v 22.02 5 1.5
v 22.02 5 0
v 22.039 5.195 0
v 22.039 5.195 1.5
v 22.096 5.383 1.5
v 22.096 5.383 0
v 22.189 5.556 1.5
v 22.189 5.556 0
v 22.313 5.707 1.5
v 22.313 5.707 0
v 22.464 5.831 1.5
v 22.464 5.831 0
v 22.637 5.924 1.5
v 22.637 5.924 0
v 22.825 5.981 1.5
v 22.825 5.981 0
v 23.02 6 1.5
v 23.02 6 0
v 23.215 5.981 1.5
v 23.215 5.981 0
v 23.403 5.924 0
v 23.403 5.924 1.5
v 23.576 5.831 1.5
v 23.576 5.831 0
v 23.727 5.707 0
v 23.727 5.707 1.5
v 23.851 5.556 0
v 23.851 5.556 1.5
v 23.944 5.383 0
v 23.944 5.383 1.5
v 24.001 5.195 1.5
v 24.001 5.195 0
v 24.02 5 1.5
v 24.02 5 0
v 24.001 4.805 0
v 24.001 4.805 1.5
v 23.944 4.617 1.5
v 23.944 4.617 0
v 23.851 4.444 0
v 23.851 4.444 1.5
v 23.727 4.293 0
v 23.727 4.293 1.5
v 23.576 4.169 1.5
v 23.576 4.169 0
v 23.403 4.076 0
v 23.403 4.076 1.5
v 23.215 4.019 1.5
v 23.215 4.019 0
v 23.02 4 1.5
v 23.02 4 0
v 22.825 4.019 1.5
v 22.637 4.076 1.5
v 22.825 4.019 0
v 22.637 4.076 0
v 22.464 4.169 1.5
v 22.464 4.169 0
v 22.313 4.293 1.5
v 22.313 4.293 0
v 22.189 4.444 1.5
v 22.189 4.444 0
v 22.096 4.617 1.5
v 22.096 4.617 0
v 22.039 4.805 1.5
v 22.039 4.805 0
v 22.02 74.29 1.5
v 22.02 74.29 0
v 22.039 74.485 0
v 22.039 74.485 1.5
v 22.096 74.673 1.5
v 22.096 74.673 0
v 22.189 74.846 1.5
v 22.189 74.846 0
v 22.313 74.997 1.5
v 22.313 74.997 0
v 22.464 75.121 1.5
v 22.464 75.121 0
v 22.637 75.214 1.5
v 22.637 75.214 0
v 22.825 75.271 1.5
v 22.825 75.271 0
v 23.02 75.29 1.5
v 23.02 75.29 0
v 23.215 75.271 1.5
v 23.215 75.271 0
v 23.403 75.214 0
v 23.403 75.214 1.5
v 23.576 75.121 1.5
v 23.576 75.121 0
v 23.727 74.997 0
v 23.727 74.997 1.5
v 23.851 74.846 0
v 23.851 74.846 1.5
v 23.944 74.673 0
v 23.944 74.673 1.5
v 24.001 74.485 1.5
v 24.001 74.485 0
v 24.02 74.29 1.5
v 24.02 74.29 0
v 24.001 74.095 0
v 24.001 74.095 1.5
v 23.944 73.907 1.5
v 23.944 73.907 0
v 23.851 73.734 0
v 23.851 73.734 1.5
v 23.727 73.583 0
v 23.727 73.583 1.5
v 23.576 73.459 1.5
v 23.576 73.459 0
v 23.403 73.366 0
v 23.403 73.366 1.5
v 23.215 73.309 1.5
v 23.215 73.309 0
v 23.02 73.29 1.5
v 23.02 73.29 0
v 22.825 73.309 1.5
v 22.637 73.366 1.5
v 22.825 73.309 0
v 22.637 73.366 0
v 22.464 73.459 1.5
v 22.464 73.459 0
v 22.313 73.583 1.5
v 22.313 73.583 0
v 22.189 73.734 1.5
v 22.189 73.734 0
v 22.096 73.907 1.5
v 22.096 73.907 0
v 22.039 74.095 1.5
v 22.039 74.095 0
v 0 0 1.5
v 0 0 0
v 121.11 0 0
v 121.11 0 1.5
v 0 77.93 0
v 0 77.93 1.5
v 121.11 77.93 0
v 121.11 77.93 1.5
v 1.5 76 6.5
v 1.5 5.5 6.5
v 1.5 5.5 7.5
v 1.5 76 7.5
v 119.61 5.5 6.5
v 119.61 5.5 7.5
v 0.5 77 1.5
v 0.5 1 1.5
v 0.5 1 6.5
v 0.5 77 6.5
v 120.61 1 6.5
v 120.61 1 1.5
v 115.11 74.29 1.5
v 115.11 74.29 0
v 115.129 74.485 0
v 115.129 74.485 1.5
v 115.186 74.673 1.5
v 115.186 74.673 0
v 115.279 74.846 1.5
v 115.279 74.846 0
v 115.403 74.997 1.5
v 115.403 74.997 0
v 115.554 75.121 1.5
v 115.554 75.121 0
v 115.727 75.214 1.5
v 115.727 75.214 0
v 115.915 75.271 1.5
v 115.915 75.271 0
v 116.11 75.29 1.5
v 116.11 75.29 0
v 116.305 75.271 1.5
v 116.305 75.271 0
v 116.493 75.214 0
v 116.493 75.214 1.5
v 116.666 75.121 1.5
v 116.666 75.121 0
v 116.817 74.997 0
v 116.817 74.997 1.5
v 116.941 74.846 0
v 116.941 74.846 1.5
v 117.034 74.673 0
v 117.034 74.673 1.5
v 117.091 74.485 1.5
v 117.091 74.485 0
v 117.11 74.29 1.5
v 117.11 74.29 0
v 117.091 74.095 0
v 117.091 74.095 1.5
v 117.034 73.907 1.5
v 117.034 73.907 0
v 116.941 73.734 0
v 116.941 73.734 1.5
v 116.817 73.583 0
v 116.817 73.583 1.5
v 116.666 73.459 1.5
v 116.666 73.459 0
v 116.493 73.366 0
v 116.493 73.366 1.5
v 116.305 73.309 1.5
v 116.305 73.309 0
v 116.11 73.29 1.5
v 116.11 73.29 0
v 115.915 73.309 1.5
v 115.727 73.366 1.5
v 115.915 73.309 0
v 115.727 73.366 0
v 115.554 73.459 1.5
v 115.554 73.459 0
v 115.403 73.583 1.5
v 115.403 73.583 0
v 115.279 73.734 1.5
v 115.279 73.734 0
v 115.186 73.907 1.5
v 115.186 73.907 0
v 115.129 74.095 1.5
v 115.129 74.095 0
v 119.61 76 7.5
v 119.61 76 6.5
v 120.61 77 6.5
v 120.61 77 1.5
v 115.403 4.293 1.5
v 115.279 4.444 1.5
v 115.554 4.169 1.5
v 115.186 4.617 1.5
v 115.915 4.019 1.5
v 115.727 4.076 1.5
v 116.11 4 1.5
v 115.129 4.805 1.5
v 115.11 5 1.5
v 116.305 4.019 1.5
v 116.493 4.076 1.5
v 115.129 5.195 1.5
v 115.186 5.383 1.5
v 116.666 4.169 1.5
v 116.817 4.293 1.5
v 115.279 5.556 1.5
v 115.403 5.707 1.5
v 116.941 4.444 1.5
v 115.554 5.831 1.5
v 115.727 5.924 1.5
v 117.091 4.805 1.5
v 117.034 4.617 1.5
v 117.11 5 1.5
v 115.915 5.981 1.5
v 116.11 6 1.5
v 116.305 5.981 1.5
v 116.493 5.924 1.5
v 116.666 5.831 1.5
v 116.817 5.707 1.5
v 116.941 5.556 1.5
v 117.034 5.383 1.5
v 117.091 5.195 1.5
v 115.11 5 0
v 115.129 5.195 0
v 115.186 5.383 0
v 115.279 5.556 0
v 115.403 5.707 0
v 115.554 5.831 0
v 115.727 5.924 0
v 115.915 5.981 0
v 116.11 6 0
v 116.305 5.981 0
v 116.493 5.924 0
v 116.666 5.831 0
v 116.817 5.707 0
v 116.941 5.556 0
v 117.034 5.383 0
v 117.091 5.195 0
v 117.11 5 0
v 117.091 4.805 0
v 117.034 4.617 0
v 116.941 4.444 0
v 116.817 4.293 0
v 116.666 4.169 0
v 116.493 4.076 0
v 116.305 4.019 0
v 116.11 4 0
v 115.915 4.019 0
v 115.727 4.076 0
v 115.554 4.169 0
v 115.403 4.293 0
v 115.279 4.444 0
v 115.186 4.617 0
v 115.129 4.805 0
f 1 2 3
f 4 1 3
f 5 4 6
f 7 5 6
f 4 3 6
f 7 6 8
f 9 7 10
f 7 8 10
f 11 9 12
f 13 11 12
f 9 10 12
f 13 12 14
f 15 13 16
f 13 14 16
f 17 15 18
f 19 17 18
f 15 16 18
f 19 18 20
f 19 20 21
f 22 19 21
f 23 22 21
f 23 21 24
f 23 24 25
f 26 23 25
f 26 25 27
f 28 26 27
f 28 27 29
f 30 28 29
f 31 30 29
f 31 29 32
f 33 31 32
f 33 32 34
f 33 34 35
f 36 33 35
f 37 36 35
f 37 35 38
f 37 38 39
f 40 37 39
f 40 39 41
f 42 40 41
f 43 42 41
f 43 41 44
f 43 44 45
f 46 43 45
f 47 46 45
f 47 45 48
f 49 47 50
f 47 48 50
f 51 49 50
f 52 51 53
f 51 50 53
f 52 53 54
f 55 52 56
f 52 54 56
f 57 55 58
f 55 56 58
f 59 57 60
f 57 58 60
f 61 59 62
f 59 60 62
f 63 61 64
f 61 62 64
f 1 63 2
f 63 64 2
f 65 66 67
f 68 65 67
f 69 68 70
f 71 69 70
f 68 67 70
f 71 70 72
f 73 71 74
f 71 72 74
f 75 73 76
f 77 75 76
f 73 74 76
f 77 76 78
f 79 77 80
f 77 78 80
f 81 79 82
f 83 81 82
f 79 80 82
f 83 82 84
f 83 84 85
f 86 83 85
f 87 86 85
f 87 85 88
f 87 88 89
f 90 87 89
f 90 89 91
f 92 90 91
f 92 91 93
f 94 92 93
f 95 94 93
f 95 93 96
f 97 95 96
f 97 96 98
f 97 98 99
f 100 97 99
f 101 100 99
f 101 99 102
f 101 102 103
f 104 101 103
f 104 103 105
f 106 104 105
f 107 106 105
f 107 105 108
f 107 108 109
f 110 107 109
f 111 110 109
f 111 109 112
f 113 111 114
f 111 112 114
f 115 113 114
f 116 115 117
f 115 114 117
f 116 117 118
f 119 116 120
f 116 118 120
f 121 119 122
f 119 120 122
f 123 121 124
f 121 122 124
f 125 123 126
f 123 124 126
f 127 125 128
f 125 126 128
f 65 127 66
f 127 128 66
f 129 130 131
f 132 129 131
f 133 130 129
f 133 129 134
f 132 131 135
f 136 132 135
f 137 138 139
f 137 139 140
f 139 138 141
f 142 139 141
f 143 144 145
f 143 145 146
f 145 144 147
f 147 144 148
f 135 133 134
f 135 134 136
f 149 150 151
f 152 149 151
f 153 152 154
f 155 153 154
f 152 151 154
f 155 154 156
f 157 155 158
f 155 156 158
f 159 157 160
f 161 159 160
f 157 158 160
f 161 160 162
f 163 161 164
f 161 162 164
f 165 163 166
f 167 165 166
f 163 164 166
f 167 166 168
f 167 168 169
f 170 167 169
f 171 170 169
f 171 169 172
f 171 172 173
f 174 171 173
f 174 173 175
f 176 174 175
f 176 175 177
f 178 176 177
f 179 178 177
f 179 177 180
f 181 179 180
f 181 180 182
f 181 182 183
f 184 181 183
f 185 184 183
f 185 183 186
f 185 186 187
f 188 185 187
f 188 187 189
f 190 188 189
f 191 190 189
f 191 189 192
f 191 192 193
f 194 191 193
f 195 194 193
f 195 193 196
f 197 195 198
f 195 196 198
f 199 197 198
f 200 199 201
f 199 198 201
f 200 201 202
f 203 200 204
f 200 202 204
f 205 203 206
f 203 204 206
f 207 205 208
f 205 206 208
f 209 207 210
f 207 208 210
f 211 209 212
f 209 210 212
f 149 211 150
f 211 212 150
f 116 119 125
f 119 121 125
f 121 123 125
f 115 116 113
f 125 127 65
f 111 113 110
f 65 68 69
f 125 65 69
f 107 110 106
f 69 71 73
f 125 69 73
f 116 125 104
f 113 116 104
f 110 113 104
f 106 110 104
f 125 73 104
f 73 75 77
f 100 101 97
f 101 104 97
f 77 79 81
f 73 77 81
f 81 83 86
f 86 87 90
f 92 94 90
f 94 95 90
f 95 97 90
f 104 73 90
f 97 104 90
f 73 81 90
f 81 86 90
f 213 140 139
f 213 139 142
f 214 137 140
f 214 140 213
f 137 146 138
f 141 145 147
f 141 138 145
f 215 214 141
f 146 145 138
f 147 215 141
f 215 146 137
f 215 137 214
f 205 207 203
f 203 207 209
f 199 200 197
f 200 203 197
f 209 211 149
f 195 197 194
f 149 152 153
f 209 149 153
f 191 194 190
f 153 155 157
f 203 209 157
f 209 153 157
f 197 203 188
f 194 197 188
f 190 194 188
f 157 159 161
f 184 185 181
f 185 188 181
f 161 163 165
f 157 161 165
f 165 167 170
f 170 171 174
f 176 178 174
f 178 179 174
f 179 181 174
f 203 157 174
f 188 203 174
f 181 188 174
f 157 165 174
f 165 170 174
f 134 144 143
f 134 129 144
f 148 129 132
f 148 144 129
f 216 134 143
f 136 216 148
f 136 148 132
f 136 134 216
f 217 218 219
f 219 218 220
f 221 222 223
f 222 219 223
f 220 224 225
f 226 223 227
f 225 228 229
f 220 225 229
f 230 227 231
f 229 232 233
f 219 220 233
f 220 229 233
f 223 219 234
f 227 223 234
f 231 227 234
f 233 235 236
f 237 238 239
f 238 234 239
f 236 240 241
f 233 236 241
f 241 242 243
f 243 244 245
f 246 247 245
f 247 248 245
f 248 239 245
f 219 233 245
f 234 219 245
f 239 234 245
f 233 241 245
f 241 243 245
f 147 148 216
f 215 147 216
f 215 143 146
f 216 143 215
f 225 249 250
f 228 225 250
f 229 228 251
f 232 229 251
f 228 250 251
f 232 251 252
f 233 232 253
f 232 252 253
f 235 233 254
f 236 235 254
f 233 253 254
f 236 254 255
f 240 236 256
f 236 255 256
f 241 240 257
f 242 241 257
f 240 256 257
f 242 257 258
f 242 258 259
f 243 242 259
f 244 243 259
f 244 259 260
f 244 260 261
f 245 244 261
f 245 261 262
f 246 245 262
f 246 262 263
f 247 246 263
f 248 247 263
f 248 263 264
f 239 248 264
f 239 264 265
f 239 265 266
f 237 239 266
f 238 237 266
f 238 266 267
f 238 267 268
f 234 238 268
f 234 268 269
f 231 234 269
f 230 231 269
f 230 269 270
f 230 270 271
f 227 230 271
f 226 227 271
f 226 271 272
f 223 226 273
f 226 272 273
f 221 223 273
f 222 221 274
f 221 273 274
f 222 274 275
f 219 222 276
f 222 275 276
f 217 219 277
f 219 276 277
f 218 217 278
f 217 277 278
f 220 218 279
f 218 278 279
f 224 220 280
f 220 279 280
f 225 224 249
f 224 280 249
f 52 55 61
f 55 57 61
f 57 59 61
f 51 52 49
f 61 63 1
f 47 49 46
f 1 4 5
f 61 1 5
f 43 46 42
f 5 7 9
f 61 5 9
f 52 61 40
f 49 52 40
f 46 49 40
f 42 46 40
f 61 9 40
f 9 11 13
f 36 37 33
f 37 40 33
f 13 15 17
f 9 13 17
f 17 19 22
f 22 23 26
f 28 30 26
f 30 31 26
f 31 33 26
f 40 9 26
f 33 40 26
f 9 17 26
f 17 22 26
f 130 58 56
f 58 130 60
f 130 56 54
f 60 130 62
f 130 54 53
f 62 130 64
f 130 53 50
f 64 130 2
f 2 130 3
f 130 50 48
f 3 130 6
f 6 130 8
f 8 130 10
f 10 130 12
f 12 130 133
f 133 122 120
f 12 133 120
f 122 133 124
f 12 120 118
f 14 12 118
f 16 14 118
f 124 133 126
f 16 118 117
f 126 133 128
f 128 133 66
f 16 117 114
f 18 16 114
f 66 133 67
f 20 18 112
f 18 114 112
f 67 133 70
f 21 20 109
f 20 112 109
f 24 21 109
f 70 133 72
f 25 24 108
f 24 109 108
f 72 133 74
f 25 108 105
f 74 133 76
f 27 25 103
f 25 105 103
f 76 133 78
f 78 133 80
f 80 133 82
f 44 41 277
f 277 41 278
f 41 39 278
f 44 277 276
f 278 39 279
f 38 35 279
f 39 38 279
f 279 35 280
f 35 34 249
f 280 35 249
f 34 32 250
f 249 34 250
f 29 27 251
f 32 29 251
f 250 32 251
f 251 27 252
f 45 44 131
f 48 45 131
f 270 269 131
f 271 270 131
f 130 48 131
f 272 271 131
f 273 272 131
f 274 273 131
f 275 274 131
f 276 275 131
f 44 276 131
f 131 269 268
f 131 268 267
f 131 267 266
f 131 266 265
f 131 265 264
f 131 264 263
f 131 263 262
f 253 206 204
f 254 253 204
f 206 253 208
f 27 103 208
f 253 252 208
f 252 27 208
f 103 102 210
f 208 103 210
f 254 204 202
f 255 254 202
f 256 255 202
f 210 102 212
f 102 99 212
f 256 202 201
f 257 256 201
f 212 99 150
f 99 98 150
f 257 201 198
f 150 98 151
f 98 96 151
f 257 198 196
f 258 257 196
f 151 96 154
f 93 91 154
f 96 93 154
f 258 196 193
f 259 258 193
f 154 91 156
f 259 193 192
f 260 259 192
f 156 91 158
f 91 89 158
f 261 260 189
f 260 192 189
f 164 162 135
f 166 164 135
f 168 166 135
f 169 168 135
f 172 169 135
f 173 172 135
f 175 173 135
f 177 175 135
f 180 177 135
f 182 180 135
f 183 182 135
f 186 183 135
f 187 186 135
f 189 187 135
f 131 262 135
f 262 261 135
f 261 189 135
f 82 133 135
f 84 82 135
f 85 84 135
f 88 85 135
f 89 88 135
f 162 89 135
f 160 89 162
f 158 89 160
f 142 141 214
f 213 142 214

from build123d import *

# Parameters (mm, degrees)
SKETCH_1_W            = 121.11
SKETCH_1_H            = 77.93
EXTRUDE_1_DEPTH       = 1.5
HOLE_WIZARD_2_0_2_1_D = 2
SKETCH_4_W            = 120.11
SKETCH_4_H            = 76
EXTRUDE_2_DEPTH       = 5
SKETCH_5_W            = 118.11
SKETCH_5_H            = 70.5
EXTRUDE_3_DEPTH       = 1


with BuildPart() as part:
    # 草图1 → 凸台-拉伸1 (new body)
    with BuildSketch(Plane.XY):
        with Locations((60.555, 38.965)):
            Rectangle(SKETCH_1_W, SKETCH_1_H)
    extrude(amount=EXTRUDE_1_DEPTH)

    # Ø2.0 (2) 直径孔1 (through all)
    with Locations(Plane.XY.offset(1.5)):
        with Locations((23.02, 74.29), (23.02, 5), (116.11, 74.29), (116.11, 5)):
            Hole(HOLE_WIZARD_2_0_2_1_D / 2)

    # 草图4 → 凸台-拉伸2 (add)
    with BuildSketch(Plane.XY.offset(1.5)):
        with Locations((60.555, 39)):
            Rectangle(SKETCH_4_W, SKETCH_4_H)
    extrude(amount=EXTRUDE_2_DEPTH)

    # 草图5 → 凸台-拉伸3 (add)
    with BuildSketch(Plane.XY.offset(6.5)):
        with Locations((60.555, 40.75)):
            Rectangle(SKETCH_5_W, SKETCH_5_H)
    extrude(amount=EXTRUDE_3_DEPTH)


solid = part.part
